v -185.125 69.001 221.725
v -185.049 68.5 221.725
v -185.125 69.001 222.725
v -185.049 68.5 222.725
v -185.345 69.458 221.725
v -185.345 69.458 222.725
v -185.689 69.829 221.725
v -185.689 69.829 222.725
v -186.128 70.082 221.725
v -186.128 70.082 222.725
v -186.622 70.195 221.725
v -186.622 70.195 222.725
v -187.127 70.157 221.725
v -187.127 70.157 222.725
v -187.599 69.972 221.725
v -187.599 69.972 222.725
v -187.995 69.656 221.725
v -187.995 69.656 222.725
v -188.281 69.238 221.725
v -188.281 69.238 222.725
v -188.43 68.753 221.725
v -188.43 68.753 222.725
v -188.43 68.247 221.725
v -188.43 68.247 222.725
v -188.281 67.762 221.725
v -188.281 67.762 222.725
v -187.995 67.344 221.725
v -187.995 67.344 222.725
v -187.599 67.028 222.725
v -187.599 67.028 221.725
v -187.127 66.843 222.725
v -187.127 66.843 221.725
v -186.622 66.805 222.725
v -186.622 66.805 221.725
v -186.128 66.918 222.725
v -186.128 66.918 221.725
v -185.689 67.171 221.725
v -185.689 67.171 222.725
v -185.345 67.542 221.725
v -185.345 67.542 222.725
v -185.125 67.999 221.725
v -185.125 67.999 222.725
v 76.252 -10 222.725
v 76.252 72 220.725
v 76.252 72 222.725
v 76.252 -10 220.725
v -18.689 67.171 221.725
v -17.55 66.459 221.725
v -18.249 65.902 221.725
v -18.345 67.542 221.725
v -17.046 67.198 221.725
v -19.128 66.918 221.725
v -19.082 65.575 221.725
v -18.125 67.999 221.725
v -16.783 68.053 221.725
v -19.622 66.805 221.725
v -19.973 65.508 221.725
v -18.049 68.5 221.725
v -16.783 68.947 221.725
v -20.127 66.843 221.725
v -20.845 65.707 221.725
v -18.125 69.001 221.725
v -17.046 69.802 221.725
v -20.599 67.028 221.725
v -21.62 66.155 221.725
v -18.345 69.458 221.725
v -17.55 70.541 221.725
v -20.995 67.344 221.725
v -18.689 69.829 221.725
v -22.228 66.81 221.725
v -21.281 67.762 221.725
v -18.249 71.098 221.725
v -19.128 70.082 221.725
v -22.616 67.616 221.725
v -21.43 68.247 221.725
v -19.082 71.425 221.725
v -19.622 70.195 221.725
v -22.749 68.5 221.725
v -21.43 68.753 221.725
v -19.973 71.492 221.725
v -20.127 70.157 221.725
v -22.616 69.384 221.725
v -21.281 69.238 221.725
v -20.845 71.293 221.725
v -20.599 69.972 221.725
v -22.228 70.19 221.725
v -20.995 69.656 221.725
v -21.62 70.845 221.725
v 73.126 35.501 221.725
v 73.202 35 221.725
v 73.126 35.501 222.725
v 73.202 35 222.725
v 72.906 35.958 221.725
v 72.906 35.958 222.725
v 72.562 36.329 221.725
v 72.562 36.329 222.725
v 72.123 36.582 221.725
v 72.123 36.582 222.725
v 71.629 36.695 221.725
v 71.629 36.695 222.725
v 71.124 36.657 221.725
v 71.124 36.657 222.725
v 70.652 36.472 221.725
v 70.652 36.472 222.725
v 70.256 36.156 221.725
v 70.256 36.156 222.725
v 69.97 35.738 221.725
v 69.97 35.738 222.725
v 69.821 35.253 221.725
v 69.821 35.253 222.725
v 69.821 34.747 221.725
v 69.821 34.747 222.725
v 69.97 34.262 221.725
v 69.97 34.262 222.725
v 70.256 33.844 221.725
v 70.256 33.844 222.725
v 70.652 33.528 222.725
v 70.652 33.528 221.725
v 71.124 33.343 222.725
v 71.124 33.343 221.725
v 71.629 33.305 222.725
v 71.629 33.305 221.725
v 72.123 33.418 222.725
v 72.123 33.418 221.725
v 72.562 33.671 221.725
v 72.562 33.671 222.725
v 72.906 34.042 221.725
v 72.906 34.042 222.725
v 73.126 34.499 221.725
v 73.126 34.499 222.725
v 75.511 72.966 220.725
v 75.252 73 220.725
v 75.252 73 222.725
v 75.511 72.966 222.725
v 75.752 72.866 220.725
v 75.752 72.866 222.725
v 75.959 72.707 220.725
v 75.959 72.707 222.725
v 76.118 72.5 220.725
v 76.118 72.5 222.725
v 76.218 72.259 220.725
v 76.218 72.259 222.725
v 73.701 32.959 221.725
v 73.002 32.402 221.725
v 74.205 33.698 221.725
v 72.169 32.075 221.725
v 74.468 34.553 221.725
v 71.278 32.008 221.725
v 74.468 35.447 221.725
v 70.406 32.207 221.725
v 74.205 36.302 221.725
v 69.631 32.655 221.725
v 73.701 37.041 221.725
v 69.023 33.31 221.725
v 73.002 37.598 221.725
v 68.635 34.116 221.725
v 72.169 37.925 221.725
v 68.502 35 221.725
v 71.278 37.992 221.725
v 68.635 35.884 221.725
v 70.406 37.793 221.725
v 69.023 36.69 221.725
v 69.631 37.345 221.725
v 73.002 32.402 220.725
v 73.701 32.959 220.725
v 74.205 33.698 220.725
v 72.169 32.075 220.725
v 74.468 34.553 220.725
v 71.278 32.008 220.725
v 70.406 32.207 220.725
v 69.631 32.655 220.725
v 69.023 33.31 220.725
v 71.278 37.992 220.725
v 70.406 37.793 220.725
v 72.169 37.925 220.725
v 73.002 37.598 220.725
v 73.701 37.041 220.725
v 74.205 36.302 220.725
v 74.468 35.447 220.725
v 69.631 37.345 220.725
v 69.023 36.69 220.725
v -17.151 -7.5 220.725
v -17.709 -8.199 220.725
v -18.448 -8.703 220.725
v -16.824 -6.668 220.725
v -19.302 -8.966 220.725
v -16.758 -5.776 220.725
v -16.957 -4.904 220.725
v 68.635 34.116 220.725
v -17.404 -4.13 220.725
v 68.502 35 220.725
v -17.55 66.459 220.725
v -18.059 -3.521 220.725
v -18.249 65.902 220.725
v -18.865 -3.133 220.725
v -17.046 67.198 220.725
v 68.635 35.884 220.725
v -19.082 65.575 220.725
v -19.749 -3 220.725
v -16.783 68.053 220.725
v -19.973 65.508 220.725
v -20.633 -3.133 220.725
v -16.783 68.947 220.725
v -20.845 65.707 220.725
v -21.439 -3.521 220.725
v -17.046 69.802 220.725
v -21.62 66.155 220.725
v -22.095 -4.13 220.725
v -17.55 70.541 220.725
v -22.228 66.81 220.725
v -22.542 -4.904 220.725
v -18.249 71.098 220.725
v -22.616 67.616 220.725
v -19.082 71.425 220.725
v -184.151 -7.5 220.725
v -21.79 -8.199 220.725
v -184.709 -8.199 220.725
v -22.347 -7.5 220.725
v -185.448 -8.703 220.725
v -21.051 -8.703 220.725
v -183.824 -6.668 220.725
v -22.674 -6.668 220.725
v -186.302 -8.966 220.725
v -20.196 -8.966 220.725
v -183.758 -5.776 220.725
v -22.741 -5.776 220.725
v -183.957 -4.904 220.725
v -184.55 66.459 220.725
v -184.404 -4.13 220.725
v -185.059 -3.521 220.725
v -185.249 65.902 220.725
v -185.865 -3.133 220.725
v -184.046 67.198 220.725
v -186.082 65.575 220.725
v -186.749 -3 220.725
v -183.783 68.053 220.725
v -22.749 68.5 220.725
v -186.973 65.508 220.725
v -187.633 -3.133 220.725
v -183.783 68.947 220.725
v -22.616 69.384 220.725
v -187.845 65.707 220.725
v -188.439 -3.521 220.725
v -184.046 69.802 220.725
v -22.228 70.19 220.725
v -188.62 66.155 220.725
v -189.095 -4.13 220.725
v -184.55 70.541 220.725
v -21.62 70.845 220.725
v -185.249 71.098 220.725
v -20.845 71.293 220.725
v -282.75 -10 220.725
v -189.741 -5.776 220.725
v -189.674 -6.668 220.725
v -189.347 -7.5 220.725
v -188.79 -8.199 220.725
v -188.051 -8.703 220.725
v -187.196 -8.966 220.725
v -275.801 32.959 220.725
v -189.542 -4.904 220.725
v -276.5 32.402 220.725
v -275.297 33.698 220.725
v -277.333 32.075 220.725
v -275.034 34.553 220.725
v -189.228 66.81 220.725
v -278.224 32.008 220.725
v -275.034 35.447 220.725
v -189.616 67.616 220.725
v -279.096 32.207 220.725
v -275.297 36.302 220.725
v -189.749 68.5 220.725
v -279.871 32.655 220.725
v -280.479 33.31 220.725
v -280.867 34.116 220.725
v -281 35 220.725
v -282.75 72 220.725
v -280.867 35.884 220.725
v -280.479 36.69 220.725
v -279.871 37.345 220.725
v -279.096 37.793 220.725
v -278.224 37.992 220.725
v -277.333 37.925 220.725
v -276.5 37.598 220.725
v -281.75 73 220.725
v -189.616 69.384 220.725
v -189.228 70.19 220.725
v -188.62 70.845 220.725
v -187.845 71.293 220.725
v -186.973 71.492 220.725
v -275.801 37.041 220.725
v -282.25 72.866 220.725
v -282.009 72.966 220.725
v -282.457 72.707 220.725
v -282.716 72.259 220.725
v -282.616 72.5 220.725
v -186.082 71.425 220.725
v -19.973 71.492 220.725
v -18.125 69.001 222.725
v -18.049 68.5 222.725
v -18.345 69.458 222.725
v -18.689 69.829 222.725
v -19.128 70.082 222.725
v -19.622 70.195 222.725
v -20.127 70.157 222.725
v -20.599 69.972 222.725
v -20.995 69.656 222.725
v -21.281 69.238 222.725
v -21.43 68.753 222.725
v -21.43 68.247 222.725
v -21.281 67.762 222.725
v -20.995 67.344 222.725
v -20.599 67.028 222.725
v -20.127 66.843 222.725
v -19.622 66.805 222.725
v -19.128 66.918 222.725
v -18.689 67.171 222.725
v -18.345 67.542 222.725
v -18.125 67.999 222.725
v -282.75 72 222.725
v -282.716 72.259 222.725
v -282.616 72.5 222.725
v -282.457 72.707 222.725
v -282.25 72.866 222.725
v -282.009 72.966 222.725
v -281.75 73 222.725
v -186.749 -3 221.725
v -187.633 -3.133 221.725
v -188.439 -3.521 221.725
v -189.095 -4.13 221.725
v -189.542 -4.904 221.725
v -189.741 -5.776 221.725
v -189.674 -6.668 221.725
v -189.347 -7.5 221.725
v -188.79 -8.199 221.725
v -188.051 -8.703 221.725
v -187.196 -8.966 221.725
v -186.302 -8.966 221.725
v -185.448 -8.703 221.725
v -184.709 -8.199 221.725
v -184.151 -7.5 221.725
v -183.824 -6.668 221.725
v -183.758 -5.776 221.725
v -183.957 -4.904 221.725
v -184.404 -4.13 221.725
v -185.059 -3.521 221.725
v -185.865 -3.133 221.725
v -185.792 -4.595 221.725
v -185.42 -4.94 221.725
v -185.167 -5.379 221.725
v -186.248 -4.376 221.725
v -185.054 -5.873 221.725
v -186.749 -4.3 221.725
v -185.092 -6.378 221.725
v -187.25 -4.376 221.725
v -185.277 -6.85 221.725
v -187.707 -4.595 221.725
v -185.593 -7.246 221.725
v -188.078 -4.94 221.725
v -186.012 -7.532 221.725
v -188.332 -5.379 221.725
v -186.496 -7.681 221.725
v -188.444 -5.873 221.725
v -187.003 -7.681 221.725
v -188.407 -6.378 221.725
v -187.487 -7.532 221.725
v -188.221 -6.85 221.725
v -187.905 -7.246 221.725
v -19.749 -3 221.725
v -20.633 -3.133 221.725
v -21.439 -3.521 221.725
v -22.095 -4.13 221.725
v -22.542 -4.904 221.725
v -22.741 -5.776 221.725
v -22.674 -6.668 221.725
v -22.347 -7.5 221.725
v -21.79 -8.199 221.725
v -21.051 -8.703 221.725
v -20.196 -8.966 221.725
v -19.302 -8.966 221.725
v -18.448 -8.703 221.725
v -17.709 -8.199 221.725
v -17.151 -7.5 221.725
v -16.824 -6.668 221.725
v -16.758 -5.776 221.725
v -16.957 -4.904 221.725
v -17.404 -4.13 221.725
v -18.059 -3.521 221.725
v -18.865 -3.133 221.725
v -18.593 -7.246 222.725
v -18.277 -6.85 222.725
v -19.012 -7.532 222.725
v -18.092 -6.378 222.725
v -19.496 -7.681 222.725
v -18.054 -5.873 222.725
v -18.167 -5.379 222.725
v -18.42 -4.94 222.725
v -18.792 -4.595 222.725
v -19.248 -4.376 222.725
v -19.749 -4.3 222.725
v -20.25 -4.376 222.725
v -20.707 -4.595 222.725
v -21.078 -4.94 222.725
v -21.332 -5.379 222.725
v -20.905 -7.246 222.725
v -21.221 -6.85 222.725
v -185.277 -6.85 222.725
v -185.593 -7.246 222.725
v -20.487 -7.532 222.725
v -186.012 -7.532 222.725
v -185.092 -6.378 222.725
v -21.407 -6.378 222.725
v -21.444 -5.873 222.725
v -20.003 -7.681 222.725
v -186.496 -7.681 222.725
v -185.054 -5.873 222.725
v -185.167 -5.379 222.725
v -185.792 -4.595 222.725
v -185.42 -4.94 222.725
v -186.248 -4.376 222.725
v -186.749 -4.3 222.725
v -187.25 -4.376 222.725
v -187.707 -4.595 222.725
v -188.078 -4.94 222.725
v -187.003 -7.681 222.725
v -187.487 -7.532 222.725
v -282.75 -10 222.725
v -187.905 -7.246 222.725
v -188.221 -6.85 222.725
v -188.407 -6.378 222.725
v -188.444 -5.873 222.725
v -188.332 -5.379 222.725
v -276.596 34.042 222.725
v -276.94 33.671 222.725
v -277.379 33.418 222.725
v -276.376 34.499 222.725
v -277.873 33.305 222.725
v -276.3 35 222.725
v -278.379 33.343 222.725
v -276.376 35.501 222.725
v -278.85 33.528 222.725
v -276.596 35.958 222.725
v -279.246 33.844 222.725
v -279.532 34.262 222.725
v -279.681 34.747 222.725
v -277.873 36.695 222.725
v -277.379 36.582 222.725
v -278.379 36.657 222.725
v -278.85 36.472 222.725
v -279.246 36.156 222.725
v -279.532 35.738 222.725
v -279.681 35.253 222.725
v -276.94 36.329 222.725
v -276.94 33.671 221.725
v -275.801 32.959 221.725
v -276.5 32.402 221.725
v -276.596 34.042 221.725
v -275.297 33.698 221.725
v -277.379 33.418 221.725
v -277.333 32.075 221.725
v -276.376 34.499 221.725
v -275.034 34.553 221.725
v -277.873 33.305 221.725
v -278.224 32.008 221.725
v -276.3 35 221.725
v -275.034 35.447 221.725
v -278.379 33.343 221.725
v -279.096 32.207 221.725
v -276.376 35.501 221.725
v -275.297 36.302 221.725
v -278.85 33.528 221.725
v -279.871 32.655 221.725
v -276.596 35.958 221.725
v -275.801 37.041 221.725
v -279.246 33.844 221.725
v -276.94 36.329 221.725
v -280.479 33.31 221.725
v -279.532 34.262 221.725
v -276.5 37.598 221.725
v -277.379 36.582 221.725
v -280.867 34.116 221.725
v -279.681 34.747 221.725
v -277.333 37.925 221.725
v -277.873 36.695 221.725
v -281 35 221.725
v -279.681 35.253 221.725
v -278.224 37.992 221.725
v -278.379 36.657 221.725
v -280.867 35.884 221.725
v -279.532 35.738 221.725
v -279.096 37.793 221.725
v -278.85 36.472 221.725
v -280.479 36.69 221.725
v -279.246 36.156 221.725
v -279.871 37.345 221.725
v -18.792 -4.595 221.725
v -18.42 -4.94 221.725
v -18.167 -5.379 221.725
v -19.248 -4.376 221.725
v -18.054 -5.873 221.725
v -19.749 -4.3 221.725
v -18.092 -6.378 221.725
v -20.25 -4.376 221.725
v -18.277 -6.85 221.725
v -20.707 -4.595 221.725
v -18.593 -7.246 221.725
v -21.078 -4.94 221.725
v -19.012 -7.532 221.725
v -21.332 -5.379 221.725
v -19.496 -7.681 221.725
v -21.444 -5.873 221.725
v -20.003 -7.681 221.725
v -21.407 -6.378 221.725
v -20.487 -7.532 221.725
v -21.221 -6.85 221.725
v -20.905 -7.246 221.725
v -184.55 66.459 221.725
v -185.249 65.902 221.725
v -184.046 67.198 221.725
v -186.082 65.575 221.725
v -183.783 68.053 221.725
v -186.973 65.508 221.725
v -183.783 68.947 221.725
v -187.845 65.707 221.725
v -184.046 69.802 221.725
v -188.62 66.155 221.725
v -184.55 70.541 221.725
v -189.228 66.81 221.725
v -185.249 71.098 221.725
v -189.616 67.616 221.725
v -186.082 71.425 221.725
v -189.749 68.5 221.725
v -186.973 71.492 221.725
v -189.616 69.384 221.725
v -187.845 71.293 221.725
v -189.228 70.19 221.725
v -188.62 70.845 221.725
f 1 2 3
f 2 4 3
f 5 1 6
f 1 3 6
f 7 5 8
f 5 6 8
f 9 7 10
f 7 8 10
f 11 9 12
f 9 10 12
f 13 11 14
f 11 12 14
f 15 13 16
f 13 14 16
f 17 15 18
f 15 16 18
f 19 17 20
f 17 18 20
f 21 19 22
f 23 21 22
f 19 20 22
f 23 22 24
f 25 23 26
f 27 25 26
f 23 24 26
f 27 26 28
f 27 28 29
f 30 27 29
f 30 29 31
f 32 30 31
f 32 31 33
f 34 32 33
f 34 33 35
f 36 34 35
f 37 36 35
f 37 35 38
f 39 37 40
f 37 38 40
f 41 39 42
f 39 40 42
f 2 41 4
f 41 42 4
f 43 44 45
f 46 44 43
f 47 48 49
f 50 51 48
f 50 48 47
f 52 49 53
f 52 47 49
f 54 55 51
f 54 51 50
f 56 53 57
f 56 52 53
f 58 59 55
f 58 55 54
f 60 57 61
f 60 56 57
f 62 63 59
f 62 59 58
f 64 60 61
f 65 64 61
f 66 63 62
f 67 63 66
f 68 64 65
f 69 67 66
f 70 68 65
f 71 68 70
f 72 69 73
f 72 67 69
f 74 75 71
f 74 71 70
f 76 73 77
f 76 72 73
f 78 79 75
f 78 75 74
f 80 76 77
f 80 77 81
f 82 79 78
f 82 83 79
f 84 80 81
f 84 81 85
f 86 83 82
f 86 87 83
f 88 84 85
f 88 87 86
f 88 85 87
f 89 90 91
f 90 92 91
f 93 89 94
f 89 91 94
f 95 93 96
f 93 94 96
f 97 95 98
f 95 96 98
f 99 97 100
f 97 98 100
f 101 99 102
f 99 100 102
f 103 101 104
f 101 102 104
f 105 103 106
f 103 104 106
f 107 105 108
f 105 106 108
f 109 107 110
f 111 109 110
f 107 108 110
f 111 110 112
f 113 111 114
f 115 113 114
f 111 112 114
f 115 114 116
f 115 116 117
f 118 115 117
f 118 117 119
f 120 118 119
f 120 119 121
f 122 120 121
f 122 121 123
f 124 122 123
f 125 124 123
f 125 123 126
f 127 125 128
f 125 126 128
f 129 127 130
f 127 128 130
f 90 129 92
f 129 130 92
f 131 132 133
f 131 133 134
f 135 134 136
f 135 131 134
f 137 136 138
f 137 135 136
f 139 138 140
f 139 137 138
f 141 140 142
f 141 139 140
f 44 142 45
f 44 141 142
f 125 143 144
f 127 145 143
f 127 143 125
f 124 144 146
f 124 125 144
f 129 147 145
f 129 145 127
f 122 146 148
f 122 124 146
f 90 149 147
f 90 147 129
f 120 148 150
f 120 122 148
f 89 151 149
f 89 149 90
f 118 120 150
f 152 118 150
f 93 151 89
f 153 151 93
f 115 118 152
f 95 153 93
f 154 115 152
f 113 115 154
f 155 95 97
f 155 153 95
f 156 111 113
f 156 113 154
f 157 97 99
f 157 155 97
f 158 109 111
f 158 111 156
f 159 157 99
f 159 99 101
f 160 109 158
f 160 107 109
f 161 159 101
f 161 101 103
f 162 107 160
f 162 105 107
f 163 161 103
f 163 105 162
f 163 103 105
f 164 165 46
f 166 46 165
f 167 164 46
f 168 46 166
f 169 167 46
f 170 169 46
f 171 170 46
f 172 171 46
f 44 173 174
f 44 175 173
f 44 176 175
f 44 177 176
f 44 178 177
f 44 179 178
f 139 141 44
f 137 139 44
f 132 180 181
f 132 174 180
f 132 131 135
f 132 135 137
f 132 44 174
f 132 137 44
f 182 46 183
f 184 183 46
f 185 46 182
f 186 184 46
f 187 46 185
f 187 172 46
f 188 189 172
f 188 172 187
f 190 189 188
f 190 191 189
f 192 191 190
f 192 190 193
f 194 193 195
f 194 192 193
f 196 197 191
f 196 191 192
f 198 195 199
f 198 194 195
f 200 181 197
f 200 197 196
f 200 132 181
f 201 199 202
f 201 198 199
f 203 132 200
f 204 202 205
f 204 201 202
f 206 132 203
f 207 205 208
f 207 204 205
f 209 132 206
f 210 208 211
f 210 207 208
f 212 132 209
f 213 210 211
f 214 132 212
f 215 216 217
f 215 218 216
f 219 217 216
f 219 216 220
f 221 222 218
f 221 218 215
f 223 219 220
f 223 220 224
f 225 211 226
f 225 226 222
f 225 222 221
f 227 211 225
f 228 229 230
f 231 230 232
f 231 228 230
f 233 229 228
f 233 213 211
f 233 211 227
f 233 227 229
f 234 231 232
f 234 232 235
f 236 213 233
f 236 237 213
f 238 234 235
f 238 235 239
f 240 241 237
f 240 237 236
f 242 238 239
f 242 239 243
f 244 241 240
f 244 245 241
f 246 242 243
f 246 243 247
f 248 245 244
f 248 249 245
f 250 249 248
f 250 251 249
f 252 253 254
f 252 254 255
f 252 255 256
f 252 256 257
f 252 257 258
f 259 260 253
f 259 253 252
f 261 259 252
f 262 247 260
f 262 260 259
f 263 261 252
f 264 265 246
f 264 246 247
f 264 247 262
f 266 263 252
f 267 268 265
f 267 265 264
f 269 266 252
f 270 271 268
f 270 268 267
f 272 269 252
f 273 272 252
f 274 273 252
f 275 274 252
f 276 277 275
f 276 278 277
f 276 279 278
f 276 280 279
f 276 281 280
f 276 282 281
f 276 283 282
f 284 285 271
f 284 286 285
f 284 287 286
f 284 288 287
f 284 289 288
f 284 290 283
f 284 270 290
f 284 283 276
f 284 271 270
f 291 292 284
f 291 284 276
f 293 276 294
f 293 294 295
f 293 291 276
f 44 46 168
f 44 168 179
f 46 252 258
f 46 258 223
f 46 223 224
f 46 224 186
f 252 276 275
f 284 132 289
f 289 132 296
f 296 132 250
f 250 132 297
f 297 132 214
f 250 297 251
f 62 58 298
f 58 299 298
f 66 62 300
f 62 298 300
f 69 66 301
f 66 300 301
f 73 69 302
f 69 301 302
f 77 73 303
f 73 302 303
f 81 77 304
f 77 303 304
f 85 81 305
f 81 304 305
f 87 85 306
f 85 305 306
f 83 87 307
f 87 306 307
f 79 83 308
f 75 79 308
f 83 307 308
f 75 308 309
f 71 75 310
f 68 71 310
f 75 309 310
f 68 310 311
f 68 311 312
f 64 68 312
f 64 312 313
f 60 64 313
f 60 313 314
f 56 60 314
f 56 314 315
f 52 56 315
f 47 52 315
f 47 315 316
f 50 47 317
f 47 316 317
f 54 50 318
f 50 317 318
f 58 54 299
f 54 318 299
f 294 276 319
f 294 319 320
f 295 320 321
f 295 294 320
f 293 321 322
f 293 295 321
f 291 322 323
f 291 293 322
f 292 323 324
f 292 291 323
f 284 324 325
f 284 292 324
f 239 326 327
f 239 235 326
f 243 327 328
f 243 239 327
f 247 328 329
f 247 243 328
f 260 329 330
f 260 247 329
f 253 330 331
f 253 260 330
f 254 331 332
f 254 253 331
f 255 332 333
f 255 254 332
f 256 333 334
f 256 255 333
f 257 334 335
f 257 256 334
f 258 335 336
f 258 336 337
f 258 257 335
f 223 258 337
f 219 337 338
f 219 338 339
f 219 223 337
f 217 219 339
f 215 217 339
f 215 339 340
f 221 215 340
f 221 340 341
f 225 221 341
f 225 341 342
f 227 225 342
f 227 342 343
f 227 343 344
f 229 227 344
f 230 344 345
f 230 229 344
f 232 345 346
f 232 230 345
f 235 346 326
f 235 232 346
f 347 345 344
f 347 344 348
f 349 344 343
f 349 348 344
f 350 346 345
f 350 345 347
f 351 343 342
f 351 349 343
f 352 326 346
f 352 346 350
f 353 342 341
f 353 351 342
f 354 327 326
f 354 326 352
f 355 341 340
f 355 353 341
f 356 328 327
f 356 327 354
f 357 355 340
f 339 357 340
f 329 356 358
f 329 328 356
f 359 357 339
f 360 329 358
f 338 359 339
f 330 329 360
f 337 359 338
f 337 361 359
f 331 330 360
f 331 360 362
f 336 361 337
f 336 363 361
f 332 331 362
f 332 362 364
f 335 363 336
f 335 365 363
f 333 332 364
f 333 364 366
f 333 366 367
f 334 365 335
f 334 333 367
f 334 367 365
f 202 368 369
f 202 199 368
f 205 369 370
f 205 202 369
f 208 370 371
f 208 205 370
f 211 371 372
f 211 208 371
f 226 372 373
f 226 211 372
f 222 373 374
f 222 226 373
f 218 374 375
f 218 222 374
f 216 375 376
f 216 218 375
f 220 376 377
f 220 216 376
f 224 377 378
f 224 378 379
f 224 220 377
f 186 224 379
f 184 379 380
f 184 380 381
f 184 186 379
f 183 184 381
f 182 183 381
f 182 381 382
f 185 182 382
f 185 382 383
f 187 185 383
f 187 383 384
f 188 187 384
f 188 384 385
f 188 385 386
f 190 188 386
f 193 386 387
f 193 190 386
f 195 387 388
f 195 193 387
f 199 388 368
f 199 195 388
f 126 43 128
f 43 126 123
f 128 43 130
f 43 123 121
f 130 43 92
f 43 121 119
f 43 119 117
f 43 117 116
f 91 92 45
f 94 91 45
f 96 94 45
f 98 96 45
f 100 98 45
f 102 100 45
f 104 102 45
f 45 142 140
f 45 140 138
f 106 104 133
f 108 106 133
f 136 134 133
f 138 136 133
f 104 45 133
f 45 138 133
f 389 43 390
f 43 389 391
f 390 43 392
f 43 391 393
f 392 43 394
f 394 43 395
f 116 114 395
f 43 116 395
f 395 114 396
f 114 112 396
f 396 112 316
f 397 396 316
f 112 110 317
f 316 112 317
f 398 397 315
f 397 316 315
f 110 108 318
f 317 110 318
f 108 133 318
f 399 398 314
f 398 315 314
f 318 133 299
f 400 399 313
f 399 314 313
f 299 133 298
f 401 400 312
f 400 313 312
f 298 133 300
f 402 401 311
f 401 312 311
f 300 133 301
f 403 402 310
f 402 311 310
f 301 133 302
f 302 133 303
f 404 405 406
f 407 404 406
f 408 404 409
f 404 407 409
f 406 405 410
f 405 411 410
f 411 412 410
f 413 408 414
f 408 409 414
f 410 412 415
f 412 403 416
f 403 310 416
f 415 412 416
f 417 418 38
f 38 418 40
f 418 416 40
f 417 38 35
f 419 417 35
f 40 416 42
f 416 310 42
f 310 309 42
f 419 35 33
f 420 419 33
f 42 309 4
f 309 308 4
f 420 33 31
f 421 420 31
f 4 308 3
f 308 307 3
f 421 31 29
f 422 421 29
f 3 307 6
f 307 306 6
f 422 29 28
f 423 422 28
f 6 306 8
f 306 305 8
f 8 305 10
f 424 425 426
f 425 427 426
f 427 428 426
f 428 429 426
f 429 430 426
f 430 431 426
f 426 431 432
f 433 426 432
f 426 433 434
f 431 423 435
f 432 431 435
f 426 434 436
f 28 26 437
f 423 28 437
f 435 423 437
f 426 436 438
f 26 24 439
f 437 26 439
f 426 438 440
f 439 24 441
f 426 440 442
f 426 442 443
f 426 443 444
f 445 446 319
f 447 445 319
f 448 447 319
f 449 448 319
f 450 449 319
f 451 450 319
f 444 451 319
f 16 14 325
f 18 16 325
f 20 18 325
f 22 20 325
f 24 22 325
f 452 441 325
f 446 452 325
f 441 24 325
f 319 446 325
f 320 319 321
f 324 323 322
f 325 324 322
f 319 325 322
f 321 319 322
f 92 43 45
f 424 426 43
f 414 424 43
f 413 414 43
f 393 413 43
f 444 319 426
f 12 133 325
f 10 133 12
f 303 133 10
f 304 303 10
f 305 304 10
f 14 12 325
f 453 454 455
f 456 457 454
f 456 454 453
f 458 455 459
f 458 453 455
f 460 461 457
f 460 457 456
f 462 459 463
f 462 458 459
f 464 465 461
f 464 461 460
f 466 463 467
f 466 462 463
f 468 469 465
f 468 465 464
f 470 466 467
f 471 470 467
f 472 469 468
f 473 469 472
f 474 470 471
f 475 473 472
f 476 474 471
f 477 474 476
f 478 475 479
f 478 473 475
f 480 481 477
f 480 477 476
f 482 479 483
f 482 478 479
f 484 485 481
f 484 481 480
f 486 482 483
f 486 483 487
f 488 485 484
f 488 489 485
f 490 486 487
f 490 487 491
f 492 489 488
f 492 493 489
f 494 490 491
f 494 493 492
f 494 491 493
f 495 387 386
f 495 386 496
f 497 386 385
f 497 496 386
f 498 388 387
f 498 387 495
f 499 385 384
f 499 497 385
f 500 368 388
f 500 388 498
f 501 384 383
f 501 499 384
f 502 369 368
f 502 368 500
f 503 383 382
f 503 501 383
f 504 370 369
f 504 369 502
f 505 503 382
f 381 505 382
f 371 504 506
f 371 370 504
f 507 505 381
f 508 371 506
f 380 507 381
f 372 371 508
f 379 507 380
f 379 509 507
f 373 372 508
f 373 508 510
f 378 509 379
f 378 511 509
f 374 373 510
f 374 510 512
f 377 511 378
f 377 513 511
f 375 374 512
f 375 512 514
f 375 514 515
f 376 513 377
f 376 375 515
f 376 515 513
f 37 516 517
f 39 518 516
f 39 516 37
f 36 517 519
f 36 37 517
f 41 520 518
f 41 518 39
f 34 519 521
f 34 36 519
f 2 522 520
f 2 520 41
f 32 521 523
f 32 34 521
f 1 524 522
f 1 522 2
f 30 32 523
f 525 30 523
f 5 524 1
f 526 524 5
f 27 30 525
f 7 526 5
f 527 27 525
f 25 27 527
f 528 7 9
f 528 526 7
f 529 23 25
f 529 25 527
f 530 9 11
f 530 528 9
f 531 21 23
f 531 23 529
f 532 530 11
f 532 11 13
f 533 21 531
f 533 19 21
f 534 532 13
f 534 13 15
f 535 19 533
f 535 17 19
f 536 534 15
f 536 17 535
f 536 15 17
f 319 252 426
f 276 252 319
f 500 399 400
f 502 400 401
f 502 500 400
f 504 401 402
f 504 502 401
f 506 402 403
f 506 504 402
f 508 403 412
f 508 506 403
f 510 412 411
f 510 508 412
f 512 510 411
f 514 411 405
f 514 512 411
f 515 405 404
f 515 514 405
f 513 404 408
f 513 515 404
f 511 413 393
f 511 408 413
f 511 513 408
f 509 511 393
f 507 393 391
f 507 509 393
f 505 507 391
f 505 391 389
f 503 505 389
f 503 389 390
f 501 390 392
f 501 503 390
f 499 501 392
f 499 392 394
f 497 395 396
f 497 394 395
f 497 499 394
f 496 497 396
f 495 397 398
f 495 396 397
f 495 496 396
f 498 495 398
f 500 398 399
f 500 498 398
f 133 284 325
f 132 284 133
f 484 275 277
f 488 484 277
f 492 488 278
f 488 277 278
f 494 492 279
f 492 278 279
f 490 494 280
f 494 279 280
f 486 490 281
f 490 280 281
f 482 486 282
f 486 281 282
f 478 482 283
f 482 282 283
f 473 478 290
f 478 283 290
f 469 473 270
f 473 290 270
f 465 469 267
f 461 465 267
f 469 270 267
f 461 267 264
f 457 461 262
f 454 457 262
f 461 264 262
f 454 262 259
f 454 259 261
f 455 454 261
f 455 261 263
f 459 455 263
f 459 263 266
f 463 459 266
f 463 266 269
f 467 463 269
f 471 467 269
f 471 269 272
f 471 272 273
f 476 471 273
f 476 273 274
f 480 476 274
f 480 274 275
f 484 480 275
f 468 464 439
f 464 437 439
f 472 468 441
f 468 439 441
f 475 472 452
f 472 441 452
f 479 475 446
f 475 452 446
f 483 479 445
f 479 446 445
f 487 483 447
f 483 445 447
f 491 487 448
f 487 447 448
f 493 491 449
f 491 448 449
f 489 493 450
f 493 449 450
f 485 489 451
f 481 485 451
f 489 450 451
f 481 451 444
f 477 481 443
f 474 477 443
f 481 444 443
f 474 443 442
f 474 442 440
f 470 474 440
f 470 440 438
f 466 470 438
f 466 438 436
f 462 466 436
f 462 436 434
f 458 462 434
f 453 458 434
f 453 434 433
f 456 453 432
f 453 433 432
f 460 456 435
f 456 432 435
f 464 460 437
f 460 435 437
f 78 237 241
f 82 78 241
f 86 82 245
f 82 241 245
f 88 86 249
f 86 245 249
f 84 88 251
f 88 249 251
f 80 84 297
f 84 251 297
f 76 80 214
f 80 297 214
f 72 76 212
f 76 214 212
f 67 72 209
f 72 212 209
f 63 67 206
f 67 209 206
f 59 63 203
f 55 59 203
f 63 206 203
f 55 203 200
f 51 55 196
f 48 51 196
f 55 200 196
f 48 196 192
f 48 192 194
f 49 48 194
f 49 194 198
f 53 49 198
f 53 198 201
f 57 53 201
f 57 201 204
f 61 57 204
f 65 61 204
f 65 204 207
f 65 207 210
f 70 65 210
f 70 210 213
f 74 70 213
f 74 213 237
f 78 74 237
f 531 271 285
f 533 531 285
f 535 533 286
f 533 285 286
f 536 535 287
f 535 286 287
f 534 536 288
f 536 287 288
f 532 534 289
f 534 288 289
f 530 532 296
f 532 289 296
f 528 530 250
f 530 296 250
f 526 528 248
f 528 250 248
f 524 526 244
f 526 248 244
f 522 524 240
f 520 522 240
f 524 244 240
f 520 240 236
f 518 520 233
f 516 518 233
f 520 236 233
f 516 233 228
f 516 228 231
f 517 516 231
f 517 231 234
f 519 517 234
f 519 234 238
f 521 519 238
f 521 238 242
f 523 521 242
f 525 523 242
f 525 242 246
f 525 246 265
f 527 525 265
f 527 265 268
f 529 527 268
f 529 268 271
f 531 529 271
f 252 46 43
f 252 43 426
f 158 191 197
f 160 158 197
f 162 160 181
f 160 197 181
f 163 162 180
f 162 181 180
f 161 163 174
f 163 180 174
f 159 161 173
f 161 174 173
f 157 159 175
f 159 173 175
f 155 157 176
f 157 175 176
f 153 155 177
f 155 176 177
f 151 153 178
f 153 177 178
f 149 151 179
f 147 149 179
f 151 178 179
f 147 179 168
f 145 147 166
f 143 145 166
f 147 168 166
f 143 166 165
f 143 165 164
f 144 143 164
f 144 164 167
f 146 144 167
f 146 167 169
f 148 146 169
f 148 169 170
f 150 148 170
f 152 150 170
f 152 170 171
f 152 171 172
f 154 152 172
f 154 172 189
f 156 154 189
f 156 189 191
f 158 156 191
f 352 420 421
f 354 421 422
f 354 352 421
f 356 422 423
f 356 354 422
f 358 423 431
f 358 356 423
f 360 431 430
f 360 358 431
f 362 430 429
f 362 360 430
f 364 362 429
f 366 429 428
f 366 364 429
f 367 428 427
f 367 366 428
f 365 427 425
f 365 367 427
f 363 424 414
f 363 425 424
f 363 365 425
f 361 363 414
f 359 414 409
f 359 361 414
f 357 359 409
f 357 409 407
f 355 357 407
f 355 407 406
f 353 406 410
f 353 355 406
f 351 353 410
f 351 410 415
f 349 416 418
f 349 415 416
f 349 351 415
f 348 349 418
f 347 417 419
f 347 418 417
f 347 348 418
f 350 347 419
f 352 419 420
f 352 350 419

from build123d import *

# Parameters (mm, degrees)
EXTRUDE_1_DEPTH            = 2
HOLE_WIZARD_2_D            = 3.4
HOLE_WIZARD_2_DEPTH        = 7.5
HOLE_WIZARD_2_CBORE_D      = 6
HOLE_WIZARD_2_CBORE_DEPTH  = 1
HOLE_WIZARD_2_TIP          = 1.021463052
CUT_EXTRUDE_1_DEPTH        = 3
HOLE_WIZARD_2_2_AT_2_COUNT = 2
HOLE_WIZARD_2_2_AT_2_PITCH = 167
EXTRUDE_3_DEPTH            = 2


with BuildPart() as part:
    # 草图1 → 凸台-拉伸1 (new body)
    with BuildSketch(Plane(origin=(0, 0, 222.724508868), x_dir=(-1, 0, 0), z_dir=(0, 0, -1))):
        with BuildLine():
            Line((-76.251869293, -10), (282.750233779, -10))
            Line((282.750233779, -10), (282.750233779, 70))
            ThreePointArc((282.750233779, 70), (281.871554123, 72.121320344), (279.750233779, 73))
            Line((279.750233779, 73), (-73.251869293, 73))
            ThreePointArc((-73.251869293, 73), (-75.373189637, 72.121320344), (-76.251869293, 70))
            Line((-76.251869293, 70), (-76.251869293, -10))
        make_face()
    extrude(amount=EXTRUDE_1_DEPTH)

    # Hole Wizard 2
    with Locations(Plane(origin=(71.501869293, 35, 220.724508868), x_dir=(-1, 0, 0), z_dir=(0, 0, -1))):
        with Locations((0, 0), (91.251051536, 33.5), (258.251051536, 33.5), (349.502103072, 0)):
            CounterBoreHole(HOLE_WIZARD_2_D / 2, HOLE_WIZARD_2_CBORE_D / 2, HOLE_WIZARD_2_CBORE_DEPTH, depth=HOLE_WIZARD_2_DEPTH)
            with Locations((0, 0, -(HOLE_WIZARD_2_DEPTH + HOLE_WIZARD_2_TIP / 2))):  # 118° drill point
                Cone(0, HOLE_WIZARD_2_D / 2, HOLE_WIZARD_2_TIP, mode=Mode.SUBTRACT)

    # 草图4 → 切除-拉伸1 (cut, through all)
    with BuildSketch(Plane(origin=(0, 0, 220.724508868), x_dir=(-1, 0, 0), z_dir=(0, 0, -1))):
        with BuildLine():
            Line((-76.251869293, 70), (-76.251869293, -10))
            Line((-76.251869293, -10), (-75.751869293, -10))
            Line((-75.751869293, -10), (-75.751869293, 70))
            ThreePointArc((-75.751869293, 70), (-75.019636246, 71.767766953), (-73.251869293, 72.5))
            Line((-73.251869293, 72.5), (279.750233779, 72.5))
            ThreePointArc((279.750233779, 72.5), (281.518000732, 71.767766953), (282.250233779, 70))
            Line((282.250233779, 70), (282.250233779, -10))
            Line((282.250233779, -10), (282.750233779, -10))
            Line((282.750233779, -10), (282.750233779, 70))
            ThreePointArc((282.750233779, 70), (281.871554123, 72.121320344), (279.750233779, 73))
            Line((279.750233779, 73), (-73.251869293, 73))
            ThreePointArc((-73.251869293, 73), (-75.373189637, 72.121320344), (-76.251869293, 70))
        make_face()
    extrude(amount=-CUT_EXTRUDE_1_DEPTH, mode=Mode.SUBTRACT)

    # 草图5 → Hole Wizard 2 2 (revolve, cut)
    with BuildSketch(Plane(origin=(-19.749182243, -6, 220.724508868), x_dir=(0, 1, 0), z_dir=(1, 0, 0))):
        Polygon((0, 0), (0, 20.521463052), (1.7, 19.5), (1.7, 1), (3, 1), (3, 0), align=None)
    hole_wizard_2_2 = revolve(axis=Axis((-19.749182243, -6, 214.374508868), (0, 0, 1)), mode=Mode.SUBTRACT)

    # Hole Wizard 2 2 at 2: Hole Wizard 2 2 ×2
    with Locations(*[(-i * HOLE_WIZARD_2_2_AT_2_PITCH, 0, 0) for i in range(1, HOLE_WIZARD_2_2_AT_2_COUNT)]):
        add(hole_wizard_2_2, mode=Mode.SUBTRACT)

    # 草图6 → 凸台-拉伸3 (add)
    with BuildSketch(Plane(origin=(0, 0, 220.724508868), x_dir=(-1, 0, 0), z_dir=(0, 0, -1))):
        with BuildLine():
            Line((-76.251869293, 72), (-76.251869293, -10))
            Line((-76.251869293, -10), (-75.751869293, -10))
            Line((-75.751869293, -10), (-75.751869293, 70))
            ThreePointArc((-75.751869293, 70), (-75.019636246, 71.767766953), (-73.251869293, 72.5))
            Line((-73.251869293, 72.5), (279.750233779, 72.5))
            ThreePointArc((279.750233779, 72.5), (281.518000732, 71.767766953), (282.250233779, 70))
            Line((282.250233779, 70), (282.250233779, -10))
            Line((282.250233779, -10), (282.750233779, -10))
            Line((282.750233779, -10), (282.750233779, 72))
            ThreePointArc((282.750233779, 72), (282.457340561, 72.707106781), (281.750233779, 73))
            Line((281.750233779, 73), (-75.251869293, 73))
            ThreePointArc((-75.251869293, 73), (-75.958976075, 72.707106781), (-76.251869293, 72))
        make_face()
    extrude(amount=-EXTRUDE_3_DEPTH)


solid = part.part
